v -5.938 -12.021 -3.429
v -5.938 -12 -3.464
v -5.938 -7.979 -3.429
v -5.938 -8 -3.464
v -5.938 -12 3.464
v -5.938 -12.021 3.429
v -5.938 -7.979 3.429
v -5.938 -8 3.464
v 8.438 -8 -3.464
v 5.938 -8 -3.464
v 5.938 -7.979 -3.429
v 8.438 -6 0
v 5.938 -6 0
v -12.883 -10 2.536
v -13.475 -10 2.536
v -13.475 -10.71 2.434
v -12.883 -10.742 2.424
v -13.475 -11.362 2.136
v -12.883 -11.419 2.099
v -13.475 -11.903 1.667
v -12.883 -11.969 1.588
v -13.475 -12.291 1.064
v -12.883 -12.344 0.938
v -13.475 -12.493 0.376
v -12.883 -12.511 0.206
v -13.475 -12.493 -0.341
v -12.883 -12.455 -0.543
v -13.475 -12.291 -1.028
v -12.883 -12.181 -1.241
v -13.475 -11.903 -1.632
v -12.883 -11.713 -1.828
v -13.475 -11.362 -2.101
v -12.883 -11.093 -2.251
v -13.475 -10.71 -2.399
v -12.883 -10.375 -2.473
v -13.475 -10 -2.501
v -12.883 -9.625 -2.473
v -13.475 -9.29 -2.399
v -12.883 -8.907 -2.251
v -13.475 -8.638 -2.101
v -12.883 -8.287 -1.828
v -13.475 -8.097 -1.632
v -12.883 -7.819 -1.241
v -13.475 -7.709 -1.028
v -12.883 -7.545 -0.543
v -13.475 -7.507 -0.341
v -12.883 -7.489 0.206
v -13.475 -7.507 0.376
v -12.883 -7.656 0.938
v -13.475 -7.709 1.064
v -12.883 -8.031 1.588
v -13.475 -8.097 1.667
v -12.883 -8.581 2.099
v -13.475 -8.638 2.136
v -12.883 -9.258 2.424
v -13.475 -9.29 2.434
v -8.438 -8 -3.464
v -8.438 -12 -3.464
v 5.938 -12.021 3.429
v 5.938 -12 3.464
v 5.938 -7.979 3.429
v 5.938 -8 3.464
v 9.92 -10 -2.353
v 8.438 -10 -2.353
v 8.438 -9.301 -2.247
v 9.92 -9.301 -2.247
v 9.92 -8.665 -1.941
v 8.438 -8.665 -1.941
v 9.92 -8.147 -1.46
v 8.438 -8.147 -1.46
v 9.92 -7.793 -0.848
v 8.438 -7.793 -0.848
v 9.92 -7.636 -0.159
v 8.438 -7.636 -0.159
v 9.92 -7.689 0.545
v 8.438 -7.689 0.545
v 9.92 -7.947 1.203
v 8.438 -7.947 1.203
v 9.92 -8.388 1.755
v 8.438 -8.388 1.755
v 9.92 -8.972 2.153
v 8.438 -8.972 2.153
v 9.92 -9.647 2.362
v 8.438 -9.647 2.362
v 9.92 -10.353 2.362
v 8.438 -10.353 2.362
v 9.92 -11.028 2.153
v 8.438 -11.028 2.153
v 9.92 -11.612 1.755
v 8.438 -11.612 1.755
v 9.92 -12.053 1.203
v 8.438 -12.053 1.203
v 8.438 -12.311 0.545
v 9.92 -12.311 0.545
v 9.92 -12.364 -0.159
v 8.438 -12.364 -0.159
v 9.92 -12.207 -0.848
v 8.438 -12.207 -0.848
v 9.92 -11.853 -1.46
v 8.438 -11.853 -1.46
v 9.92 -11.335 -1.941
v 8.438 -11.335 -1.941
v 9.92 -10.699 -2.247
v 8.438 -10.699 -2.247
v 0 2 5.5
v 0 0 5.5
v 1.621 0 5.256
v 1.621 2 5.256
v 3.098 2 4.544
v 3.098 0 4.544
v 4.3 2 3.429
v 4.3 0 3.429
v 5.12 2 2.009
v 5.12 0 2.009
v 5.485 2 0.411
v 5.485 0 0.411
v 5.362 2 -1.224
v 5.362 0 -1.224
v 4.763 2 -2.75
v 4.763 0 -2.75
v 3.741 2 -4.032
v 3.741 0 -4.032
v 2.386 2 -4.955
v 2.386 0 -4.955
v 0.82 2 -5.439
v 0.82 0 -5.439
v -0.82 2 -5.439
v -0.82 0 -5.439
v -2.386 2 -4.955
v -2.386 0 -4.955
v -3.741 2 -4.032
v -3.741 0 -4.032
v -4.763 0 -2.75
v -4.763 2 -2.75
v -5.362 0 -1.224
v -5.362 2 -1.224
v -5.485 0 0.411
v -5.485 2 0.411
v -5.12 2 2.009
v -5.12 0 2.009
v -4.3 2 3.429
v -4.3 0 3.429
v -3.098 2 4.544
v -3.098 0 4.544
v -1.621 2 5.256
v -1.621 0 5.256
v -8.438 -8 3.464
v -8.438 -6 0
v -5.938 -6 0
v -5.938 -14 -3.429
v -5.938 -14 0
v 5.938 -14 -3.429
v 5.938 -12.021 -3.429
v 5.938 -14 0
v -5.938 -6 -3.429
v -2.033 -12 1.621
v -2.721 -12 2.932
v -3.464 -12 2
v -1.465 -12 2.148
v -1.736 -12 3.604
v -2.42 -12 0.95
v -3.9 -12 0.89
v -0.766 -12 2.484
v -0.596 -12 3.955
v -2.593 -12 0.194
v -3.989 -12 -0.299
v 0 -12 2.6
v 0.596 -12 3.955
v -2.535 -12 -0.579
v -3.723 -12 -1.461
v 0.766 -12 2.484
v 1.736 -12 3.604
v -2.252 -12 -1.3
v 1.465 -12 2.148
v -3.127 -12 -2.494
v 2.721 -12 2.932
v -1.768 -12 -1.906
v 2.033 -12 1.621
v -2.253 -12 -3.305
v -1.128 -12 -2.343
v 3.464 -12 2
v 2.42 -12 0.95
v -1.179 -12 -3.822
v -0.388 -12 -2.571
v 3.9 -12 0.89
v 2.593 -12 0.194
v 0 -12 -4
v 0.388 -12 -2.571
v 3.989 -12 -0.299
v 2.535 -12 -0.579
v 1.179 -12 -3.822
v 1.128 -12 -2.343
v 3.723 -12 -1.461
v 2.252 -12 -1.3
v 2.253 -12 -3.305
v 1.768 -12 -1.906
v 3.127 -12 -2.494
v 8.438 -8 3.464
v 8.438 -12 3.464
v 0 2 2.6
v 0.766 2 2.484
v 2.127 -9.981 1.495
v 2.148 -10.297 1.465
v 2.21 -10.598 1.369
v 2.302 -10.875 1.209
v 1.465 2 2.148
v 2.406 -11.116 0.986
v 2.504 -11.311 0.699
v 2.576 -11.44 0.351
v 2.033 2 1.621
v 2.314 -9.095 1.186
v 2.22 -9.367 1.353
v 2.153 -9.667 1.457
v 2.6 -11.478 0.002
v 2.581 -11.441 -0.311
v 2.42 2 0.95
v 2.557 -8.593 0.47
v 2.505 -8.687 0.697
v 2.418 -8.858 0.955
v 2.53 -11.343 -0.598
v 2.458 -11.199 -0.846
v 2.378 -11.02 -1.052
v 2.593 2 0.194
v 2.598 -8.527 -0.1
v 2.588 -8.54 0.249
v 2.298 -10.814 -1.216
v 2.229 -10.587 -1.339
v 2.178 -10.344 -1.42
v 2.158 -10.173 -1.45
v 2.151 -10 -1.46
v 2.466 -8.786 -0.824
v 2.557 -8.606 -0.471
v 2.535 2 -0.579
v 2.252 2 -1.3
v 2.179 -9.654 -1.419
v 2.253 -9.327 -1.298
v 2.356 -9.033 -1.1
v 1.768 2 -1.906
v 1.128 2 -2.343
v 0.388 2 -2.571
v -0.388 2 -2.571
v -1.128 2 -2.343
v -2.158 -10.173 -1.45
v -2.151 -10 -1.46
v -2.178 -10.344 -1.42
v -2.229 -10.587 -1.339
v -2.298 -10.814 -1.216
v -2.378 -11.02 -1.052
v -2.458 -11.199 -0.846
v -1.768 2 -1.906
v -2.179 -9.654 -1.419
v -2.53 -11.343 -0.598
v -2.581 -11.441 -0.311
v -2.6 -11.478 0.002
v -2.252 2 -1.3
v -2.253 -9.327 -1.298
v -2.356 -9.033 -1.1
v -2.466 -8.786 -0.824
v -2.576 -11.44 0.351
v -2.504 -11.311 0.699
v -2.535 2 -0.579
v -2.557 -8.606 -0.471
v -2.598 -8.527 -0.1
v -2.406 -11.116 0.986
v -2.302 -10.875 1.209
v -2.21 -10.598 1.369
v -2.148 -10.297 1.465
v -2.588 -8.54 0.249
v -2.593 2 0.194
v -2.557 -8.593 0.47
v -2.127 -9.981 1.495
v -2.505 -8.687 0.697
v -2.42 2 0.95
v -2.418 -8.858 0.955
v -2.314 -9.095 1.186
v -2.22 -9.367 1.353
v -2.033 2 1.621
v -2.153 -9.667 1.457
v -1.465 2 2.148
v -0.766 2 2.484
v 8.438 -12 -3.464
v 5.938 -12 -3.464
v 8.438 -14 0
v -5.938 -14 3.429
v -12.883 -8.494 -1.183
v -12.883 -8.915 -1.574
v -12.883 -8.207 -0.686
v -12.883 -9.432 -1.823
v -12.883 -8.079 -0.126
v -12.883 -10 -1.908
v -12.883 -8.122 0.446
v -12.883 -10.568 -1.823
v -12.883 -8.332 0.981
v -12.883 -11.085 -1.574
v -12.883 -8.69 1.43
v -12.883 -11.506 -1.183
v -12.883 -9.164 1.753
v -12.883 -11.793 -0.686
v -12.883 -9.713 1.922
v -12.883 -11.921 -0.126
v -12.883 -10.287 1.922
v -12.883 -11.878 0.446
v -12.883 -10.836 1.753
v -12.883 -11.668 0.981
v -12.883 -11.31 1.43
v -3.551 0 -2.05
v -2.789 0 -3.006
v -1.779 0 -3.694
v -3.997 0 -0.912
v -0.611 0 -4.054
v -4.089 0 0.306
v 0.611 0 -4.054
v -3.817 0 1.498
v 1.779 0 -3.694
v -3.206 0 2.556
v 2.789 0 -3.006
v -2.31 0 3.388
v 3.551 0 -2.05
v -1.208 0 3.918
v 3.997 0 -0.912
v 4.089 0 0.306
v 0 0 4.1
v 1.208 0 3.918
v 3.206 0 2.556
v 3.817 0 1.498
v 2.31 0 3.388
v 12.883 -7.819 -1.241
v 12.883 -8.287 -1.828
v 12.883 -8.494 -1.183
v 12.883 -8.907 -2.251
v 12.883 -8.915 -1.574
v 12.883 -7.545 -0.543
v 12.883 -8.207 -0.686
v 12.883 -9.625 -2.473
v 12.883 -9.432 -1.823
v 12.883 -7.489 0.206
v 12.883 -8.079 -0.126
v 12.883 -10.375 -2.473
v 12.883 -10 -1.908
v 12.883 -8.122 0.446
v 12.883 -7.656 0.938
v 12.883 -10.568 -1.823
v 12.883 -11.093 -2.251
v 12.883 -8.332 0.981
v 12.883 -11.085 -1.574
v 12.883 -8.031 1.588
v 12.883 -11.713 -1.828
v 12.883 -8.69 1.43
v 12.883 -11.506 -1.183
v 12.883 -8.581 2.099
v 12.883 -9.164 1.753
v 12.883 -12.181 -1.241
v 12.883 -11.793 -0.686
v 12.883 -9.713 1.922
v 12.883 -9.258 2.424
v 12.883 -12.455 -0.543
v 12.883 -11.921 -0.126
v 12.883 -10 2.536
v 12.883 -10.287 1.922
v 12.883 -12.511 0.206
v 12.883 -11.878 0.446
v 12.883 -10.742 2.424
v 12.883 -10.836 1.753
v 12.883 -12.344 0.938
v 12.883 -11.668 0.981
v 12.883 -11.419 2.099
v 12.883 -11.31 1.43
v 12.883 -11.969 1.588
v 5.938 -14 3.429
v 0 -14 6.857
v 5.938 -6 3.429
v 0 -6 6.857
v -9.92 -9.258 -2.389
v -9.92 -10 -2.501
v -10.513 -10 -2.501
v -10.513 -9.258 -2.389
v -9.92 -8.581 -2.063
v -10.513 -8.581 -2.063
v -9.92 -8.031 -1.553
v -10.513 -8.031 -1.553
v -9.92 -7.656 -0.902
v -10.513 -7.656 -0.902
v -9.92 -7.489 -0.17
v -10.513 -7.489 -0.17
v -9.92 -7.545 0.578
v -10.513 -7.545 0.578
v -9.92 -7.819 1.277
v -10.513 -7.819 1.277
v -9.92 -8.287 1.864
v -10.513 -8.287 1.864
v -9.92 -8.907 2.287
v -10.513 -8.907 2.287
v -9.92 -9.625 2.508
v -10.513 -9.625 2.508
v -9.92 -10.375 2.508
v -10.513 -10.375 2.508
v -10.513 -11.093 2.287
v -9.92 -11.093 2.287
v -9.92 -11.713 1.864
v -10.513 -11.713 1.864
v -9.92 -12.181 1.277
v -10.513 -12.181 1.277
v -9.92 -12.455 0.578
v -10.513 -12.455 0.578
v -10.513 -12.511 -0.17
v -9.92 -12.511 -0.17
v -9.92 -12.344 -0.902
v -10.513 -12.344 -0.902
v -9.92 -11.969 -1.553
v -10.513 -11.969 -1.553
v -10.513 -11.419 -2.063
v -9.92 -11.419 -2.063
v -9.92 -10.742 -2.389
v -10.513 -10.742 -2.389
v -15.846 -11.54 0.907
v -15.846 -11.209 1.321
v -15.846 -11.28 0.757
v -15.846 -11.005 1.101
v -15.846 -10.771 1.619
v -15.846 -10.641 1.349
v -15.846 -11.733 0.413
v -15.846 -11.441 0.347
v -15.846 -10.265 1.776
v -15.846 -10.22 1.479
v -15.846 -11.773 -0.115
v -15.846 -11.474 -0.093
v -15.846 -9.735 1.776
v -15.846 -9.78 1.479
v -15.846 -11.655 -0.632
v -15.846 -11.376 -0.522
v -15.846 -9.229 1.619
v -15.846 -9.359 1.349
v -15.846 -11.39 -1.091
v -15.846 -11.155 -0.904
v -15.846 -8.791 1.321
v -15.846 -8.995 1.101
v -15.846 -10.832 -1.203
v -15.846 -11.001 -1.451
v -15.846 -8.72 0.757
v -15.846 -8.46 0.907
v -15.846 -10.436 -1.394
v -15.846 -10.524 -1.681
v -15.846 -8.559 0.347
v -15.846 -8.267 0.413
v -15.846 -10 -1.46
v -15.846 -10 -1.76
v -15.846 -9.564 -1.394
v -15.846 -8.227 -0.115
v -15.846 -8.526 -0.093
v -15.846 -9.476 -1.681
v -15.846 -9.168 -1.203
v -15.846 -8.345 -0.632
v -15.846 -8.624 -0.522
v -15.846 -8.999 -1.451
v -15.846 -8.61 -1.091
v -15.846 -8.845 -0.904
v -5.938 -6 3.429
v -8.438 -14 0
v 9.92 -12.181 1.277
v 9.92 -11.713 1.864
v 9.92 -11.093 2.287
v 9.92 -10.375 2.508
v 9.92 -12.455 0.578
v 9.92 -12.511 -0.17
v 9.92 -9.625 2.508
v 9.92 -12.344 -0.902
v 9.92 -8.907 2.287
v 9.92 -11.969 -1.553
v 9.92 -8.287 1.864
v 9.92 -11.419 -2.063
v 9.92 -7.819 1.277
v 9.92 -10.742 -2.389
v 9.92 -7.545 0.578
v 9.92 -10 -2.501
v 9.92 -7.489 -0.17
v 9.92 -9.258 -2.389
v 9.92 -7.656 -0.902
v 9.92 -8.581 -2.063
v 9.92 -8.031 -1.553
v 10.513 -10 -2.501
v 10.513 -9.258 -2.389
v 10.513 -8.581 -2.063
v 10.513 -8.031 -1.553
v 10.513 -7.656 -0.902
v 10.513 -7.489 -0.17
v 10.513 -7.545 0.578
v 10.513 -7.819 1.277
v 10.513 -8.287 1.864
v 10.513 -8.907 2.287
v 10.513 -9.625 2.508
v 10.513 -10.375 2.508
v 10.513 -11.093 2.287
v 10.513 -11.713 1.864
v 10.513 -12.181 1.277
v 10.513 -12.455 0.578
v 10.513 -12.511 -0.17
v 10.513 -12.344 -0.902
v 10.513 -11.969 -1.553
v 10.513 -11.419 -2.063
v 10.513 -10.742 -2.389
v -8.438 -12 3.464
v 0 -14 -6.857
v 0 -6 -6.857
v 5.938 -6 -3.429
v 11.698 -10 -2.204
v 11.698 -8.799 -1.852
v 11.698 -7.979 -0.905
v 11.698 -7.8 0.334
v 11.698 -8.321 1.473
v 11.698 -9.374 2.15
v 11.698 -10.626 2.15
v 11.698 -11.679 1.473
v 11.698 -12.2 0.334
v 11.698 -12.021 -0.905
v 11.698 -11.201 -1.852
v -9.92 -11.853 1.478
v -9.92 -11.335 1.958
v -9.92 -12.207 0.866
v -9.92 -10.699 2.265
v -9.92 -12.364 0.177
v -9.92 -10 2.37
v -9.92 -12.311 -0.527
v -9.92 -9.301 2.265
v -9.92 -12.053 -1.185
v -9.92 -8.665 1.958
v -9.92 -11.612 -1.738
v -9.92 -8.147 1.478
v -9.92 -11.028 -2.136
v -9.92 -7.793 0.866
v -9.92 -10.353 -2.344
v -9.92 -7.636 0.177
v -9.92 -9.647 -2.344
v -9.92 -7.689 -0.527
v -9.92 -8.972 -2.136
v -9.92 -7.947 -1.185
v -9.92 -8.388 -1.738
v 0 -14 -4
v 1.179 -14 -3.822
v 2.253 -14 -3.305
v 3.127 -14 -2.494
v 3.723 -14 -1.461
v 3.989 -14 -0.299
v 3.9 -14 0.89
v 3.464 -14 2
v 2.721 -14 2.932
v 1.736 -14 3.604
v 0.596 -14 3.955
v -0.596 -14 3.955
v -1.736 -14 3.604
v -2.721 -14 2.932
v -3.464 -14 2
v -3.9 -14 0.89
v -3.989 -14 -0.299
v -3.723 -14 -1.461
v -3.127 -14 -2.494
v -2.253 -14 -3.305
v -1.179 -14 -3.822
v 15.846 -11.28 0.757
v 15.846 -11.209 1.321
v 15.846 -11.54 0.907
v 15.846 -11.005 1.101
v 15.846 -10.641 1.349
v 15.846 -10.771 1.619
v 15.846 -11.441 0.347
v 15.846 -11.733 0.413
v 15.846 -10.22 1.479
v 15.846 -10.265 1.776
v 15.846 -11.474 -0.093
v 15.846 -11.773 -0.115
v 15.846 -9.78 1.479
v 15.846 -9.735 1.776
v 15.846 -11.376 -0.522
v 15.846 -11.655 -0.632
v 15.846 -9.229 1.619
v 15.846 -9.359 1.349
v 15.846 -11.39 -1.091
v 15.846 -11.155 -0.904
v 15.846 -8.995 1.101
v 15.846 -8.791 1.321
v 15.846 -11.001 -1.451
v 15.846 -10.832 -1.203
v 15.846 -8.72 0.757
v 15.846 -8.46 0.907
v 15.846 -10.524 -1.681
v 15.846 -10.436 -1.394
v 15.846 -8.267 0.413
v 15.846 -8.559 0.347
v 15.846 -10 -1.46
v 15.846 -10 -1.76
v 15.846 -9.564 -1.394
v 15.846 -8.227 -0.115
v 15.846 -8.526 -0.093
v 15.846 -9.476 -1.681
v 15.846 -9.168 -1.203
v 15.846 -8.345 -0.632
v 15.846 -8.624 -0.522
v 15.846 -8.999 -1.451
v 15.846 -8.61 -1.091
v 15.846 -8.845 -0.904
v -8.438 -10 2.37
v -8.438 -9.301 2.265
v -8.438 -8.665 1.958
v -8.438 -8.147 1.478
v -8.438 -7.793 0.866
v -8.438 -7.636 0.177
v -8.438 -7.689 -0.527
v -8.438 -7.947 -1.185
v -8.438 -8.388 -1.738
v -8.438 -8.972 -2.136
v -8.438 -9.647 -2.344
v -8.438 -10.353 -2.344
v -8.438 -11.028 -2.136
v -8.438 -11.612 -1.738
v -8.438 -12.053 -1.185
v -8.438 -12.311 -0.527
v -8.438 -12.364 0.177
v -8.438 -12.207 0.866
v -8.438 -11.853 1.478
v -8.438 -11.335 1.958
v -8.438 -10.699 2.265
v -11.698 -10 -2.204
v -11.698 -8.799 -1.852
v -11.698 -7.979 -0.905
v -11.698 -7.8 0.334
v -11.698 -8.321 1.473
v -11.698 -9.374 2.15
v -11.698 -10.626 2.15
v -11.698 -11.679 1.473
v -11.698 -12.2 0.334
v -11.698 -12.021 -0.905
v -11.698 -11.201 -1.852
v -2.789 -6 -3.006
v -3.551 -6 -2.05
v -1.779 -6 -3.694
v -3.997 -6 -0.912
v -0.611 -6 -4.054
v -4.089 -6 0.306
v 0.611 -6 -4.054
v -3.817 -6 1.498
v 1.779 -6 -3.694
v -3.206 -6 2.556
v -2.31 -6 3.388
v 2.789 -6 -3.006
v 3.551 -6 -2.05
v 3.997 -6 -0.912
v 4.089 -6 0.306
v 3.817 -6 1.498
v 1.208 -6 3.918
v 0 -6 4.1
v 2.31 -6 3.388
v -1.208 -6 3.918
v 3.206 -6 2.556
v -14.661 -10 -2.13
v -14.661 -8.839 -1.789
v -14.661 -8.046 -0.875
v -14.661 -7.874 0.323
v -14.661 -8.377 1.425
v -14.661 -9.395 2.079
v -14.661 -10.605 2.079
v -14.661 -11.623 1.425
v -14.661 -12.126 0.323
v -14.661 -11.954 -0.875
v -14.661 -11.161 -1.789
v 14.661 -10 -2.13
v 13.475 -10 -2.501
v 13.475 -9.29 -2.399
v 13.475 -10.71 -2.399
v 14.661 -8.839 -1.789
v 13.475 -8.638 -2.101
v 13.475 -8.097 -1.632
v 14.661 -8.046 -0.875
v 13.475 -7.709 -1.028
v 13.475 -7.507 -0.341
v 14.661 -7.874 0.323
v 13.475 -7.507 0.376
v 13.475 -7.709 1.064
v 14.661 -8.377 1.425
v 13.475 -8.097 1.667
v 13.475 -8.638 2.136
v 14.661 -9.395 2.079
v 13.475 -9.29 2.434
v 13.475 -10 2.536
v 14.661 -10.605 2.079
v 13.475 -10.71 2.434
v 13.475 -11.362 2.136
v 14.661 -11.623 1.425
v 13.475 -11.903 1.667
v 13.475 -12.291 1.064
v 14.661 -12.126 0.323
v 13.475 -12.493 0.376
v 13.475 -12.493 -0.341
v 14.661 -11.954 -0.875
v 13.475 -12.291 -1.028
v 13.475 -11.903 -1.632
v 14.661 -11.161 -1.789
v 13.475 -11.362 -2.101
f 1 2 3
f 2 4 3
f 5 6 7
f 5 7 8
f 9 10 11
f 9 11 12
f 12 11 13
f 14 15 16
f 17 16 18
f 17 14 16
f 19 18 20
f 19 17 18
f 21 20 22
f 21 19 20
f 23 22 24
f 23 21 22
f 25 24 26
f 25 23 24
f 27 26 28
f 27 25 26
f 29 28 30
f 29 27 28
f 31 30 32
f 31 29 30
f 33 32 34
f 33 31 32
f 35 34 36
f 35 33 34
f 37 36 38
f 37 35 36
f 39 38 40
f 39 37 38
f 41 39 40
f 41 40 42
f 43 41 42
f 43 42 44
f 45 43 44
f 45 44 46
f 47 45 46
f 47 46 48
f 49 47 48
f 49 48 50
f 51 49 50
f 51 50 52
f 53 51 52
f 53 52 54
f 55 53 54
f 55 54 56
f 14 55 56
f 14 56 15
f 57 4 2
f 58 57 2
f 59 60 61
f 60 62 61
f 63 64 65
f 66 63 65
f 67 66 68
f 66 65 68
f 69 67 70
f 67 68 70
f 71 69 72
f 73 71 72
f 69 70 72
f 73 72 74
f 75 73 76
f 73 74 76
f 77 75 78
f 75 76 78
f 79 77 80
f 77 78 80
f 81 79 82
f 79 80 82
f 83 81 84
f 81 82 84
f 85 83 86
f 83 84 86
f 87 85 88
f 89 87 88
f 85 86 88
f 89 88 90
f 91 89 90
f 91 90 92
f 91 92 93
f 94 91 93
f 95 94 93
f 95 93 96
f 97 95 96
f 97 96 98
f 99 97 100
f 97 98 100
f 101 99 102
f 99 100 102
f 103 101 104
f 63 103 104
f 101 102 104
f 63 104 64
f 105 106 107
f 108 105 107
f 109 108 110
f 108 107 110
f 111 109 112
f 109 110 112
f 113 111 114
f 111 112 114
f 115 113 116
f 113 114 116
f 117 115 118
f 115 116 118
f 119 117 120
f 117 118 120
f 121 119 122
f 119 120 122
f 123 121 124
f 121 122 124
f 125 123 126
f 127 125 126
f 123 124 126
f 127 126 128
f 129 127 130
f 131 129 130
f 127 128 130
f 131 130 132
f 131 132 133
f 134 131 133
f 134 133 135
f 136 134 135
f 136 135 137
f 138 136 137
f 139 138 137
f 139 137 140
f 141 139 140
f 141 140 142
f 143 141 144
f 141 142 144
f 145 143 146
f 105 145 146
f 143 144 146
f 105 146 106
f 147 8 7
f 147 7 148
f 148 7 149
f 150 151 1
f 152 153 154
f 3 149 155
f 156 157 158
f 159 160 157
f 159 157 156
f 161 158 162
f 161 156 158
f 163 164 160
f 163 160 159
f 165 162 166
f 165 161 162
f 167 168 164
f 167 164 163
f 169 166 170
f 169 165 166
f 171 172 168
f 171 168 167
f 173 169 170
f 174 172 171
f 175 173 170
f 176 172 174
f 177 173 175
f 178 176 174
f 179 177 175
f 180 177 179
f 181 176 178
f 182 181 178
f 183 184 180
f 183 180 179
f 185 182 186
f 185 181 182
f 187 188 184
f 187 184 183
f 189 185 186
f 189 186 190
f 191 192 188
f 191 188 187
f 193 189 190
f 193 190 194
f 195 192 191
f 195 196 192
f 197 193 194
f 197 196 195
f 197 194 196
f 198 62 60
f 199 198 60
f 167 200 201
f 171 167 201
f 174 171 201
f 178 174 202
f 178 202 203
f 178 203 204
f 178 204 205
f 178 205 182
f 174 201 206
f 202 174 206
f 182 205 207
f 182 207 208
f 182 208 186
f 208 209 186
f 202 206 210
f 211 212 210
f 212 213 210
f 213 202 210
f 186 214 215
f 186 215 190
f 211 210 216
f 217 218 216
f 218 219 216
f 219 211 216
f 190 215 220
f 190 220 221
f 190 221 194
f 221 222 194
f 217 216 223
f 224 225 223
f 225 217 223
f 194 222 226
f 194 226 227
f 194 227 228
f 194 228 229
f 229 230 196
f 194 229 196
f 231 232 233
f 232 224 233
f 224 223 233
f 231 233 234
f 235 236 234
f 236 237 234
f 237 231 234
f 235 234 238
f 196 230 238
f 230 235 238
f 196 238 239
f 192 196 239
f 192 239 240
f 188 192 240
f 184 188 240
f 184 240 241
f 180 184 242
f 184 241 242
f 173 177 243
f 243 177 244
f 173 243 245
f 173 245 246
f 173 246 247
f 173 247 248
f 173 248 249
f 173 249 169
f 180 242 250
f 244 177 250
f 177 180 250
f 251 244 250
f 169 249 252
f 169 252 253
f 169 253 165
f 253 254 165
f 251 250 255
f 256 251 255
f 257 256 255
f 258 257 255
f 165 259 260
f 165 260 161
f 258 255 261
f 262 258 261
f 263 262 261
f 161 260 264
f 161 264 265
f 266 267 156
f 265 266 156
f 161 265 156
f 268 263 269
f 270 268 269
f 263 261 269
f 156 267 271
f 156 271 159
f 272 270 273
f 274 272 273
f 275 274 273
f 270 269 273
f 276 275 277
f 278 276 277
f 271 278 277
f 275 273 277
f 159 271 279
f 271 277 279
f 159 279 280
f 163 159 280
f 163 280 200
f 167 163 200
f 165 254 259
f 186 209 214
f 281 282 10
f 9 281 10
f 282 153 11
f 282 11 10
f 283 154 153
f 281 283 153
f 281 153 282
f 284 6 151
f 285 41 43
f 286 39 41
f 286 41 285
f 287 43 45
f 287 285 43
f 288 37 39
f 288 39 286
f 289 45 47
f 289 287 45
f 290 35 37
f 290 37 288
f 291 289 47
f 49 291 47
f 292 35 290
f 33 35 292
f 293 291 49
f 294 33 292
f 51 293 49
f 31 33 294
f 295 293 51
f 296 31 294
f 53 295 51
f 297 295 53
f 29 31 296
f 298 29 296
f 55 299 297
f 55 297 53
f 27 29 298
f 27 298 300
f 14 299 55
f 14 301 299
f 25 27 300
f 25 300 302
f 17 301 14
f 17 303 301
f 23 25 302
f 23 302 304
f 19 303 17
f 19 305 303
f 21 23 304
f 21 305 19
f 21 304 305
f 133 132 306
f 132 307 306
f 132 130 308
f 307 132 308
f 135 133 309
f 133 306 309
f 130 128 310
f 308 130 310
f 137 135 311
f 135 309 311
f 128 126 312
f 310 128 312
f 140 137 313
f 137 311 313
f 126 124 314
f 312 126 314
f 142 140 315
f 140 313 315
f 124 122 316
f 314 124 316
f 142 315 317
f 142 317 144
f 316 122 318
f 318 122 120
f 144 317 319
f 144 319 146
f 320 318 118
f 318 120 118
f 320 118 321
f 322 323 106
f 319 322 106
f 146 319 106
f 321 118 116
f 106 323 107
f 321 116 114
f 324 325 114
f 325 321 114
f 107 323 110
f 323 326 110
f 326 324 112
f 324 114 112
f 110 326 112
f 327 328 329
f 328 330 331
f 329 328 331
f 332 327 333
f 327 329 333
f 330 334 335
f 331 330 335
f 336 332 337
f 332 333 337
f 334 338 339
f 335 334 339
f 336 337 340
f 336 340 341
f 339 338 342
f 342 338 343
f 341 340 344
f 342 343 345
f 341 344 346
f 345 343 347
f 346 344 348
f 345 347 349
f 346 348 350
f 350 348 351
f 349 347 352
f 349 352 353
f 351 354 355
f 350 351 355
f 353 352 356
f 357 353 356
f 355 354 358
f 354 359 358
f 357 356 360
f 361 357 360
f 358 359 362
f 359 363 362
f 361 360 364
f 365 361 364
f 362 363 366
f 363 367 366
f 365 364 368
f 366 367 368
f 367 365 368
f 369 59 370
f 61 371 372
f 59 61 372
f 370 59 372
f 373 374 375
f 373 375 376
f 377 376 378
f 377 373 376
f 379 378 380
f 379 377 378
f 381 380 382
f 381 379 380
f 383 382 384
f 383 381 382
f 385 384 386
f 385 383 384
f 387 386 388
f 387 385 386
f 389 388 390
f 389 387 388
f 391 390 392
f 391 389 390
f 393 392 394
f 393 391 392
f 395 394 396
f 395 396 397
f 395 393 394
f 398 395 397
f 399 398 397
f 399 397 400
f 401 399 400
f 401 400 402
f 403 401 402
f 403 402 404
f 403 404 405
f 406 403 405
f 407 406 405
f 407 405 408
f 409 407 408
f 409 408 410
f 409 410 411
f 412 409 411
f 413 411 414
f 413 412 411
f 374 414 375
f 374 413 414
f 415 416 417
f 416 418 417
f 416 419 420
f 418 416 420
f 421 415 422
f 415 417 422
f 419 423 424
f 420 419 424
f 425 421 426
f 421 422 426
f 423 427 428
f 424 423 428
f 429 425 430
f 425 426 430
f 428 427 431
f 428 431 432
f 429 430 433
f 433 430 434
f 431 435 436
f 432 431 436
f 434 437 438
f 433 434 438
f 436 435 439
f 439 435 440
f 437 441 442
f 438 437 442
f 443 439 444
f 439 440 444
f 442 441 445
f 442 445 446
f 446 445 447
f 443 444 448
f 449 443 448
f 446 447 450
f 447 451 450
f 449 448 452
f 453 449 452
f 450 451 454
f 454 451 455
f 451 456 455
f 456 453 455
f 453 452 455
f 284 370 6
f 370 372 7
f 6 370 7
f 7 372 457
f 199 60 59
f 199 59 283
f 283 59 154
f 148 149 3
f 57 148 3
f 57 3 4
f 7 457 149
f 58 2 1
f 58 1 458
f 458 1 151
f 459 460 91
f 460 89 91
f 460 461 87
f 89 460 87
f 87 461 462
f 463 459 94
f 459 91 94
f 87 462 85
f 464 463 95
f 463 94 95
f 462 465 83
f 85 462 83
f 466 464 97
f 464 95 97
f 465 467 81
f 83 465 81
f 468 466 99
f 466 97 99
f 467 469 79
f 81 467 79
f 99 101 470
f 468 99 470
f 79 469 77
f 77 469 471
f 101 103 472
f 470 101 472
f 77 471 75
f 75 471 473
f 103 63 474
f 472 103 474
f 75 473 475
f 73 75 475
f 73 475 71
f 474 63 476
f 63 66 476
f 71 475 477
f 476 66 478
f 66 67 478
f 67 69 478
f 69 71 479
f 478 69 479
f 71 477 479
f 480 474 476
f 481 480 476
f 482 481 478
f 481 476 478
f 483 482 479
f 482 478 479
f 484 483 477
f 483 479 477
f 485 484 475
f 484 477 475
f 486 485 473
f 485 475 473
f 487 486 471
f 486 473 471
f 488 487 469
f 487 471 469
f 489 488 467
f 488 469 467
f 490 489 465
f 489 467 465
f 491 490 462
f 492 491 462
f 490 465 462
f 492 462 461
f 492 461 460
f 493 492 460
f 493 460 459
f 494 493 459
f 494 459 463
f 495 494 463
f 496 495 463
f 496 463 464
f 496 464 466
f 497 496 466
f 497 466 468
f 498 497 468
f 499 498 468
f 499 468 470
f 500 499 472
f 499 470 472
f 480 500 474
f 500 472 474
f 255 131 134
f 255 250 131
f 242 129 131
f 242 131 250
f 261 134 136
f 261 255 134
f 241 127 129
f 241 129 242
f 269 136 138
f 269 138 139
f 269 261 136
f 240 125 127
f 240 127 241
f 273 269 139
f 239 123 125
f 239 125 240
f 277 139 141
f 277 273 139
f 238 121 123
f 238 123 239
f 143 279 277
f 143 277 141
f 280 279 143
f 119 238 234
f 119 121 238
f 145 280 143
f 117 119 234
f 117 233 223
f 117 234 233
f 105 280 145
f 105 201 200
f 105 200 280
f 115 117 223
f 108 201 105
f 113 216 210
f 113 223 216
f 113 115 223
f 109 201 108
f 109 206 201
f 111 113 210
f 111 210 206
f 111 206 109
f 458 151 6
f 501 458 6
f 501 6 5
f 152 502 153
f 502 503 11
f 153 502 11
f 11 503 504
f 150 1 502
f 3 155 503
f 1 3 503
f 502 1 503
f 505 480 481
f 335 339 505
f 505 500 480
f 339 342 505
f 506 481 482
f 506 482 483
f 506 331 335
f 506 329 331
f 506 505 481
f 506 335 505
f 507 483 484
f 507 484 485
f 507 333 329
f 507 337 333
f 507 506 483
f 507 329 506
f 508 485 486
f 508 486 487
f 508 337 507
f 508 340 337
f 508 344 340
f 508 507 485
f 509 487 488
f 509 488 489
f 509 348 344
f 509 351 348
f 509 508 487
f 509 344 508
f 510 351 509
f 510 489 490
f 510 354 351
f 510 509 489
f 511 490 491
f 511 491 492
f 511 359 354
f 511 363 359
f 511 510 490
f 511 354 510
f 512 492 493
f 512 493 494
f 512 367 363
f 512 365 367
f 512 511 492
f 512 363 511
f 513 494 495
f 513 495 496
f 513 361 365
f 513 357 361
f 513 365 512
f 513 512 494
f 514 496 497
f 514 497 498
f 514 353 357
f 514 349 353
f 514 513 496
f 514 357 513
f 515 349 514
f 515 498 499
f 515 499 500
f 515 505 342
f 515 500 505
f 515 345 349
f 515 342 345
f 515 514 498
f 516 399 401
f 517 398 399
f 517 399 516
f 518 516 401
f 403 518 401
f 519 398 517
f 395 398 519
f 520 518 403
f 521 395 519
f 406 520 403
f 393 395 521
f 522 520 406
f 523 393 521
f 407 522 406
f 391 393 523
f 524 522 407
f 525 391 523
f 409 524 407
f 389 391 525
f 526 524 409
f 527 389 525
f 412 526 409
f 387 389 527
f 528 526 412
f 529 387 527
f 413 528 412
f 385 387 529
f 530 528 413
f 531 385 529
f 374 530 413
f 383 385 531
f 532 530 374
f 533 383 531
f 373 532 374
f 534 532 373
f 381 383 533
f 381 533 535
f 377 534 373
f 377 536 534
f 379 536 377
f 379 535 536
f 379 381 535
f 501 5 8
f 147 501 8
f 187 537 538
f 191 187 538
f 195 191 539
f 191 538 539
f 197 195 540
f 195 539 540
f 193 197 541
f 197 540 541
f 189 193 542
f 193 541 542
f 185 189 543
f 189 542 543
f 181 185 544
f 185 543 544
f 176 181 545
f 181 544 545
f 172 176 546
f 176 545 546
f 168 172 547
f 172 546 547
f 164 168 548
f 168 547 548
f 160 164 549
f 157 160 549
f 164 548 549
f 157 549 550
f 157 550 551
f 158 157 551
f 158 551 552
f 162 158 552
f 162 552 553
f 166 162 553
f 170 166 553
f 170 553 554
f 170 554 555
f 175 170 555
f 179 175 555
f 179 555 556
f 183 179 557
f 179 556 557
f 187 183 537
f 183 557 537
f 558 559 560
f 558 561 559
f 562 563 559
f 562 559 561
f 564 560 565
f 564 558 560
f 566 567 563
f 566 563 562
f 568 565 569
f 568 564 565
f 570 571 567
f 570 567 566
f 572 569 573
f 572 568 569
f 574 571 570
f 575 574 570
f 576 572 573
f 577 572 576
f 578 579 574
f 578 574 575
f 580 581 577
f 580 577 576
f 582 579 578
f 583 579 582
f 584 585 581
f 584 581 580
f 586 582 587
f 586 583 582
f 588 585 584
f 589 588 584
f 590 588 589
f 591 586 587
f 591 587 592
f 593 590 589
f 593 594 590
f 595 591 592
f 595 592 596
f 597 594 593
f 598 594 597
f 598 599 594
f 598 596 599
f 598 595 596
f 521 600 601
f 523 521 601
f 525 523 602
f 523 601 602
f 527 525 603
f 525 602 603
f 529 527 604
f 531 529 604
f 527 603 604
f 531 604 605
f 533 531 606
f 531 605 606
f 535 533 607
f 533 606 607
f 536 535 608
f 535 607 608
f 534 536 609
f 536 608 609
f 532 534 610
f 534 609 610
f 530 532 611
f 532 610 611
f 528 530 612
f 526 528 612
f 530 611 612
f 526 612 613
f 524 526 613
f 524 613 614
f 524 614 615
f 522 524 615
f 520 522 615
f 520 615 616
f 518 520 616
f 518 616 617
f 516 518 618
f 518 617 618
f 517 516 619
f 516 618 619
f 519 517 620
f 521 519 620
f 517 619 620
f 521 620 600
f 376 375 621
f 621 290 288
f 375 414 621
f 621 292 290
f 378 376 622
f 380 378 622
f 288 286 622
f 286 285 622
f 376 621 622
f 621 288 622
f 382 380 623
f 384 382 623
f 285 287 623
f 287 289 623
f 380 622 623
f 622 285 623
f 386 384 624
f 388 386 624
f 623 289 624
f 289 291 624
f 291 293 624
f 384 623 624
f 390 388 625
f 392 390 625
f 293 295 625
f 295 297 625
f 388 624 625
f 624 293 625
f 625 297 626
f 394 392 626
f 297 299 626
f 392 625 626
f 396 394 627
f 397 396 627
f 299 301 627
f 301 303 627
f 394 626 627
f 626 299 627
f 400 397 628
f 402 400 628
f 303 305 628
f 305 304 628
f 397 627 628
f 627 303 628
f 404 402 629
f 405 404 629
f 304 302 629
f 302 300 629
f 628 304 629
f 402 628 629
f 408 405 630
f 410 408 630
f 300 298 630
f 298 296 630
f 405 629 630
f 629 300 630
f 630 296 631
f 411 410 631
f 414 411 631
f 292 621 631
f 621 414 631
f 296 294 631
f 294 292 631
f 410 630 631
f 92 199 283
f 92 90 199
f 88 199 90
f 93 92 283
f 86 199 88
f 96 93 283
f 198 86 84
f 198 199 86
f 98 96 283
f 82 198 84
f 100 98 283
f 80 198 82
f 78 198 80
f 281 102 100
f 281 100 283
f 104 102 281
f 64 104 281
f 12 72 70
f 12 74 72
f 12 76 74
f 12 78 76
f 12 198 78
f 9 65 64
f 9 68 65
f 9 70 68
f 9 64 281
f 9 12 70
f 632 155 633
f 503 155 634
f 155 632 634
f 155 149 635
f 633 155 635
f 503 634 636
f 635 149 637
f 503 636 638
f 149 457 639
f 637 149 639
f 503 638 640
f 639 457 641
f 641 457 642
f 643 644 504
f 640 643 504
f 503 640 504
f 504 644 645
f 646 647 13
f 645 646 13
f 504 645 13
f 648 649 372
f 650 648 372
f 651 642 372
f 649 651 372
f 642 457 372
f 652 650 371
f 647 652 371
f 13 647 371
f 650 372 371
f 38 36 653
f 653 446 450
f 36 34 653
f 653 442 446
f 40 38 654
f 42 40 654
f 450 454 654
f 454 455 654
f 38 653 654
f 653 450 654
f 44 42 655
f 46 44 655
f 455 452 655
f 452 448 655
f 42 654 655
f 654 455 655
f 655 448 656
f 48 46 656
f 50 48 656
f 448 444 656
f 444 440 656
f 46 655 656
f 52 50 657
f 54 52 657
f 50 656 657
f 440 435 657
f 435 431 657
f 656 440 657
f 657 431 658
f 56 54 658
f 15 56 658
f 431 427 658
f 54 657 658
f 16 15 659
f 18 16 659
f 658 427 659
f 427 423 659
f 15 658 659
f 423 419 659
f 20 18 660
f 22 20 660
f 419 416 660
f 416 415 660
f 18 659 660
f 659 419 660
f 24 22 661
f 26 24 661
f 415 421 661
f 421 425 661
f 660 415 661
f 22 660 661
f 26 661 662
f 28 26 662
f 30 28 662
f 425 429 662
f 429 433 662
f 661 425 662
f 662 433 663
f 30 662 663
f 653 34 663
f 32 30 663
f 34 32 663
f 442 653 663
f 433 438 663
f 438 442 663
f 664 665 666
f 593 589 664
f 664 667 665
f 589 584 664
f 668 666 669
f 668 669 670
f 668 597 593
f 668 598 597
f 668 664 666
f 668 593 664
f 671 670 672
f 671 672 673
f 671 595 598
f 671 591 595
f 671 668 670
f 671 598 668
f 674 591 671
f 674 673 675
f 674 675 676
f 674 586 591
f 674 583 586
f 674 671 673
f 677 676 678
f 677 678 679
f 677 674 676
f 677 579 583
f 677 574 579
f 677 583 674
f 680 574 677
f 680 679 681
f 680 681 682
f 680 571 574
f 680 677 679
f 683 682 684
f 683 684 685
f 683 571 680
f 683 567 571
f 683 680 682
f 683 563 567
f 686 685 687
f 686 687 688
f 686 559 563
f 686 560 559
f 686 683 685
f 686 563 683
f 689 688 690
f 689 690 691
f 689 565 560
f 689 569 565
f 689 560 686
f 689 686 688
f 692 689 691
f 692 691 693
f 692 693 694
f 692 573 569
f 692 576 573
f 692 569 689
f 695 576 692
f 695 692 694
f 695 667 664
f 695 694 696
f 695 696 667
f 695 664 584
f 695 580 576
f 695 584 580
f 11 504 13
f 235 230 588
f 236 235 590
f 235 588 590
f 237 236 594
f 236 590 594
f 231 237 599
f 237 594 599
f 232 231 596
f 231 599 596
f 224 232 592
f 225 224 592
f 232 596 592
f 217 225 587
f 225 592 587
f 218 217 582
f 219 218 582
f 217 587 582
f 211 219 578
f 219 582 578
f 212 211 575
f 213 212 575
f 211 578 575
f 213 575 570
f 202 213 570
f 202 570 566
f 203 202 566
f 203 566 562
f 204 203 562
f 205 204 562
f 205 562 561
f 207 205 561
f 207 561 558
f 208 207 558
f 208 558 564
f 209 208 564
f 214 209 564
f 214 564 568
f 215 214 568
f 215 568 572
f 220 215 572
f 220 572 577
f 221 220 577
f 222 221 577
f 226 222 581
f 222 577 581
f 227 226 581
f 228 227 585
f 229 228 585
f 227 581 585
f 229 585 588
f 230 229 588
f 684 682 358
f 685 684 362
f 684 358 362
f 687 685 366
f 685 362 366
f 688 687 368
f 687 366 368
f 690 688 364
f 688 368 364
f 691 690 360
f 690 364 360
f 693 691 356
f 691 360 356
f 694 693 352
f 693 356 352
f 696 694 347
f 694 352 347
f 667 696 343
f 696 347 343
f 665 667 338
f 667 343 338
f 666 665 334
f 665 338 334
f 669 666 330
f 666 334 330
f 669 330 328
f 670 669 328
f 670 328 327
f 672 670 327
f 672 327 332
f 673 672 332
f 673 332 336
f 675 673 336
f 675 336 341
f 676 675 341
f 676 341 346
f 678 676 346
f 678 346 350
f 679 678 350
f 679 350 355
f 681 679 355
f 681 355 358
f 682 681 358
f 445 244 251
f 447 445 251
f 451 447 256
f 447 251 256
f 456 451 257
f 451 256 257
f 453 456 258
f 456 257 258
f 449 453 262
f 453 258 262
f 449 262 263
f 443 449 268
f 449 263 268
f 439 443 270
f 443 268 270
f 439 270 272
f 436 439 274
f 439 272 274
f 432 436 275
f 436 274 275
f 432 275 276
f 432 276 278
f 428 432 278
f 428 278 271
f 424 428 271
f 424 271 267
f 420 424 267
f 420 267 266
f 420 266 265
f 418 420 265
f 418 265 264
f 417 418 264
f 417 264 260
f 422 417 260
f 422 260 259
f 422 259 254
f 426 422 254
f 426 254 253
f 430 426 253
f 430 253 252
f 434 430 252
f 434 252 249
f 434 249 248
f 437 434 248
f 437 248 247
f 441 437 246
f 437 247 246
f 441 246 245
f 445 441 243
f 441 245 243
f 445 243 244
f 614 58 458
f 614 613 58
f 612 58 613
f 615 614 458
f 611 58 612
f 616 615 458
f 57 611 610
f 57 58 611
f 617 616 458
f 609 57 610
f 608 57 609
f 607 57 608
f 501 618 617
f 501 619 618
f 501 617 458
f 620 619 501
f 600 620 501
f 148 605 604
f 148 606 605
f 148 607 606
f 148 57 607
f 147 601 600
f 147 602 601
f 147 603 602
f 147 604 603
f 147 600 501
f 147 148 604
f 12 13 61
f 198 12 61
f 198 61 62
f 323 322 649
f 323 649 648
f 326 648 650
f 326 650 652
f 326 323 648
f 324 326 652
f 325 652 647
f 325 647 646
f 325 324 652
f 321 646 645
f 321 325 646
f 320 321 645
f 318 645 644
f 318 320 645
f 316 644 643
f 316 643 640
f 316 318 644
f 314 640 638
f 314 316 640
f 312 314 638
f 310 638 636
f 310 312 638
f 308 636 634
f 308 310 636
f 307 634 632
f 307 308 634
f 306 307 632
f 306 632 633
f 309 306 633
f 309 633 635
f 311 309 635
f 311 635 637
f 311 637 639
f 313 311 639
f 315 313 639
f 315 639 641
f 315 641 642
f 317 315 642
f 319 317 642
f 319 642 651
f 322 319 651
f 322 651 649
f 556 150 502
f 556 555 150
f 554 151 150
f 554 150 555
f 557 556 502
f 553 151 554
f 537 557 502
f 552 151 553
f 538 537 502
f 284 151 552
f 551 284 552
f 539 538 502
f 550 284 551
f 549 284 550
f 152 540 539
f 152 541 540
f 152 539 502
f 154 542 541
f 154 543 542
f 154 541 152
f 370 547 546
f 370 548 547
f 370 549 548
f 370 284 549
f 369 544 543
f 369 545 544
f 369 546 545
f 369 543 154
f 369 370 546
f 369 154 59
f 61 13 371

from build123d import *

# Parameters (mm, degrees)
SKETCH1_R            = 5.5
SKETCH1_R_2          = 4.1
BOSS_EXTRUDE1_DEPTH  = 2
SKETCH2_R            = 4.1
BOSS_EXTRUDE2_DEPTH  = 8
SKETCH4_R            = 2.6
BOSS_EXTRUDE3_DEPTH  = 22
BOSS_EXTRUDE4_DEPTH  = 8
BOSS_EXTRUDE5_DEPTH  = 2.5
BOSS_EXTRUDE6_DEPTH  = 2.5
SKETCH8_R            = 2.6
CUT_EXTRUDE1_DEPTH   = 16
SKETCH9_R            = 2.37037037
BOSS_EXTRUDE7_DEPTH  = 1.481481481
SKETCH10_R           = 2.37037037
BOSS_EXTRUDE8_DEPTH  = 1.481481481
SKETCH11_R           = 2.518518519
BOSS_EXTRUDE9_DEPTH  = 0.592592593
SKETCH13_R           = 2.518518519
SKETCH12_R           = 1.925925926
SKETCH14_R           = 2.51851852
BOSS_EXTRUDE10_DEPTH = 0.592592593
SKETCH16_R           = 2.51851852
SKETCH15_R           = 1.77777778
SKETCH17_R           = 1.47777778
CUT_EXTRUDE2_DEPTH   = 31.691734637
SKETCH18_R           = 2.6
CUT_EXTRUDE3_DEPTH   = 6
SKETCH21_R           = 4
CUT_EXTRUDE4_DEPTH   = 2


with BuildPart() as part:
    # Sketch1 → Boss-Extrude1 (new body)
    with BuildSketch(Plane(origin=(0, 0, 0), x_dir=(1, 0, 0), z_dir=(0, 1, 0))):
        with Locations(Location((0, 0, 0), (0, 0, 270))):
            Circle(SKETCH1_R)
        with Locations(Location((0, 0, 0), (0, 0, 270))):
            Circle(SKETCH1_R_2, mode=Mode.SUBTRACT)
    extrude(amount=BOSS_EXTRUDE1_DEPTH)



with BuildPart() as body_2:
    # Sketch2 → Boss-Extrude2 (new body)
    with BuildSketch(Plane(origin=(0, 2, 0), x_dir=(1, 0, 0), z_dir=(0, 1, 0))):
        with Locations(Location((0, 0, 0), (0, 0, 270))):
            Circle(SKETCH2_R)
    extrude(amount=-BOSS_EXTRUDE2_DEPTH)


with BuildPart() as part_1:
    add(part.part)

    add(body_2.part)  # Boss-Extrude3 merges body 2
    # Sketch4 → Boss-Extrude3 (add)
    with BuildSketch(Plane(origin=(0, 2, 0), x_dir=(1, 0, 0), z_dir=(0, 1, 0))):
        with Locations(Location((0, 0, 0), (0, 0, 270))):
            Circle(SKETCH4_R)
    extrude(amount=-BOSS_EXTRUDE3_DEPTH)

    # Sketch5 → Boss-Extrude4 (add)
    with BuildSketch(Plane.XZ.offset(6)):
        Polygon((5.938459912, -3.428571429), (5.938459912, 3.428571429), (0, 6.857142857), (-5.938459912, 3.428571429), (-5.938459912, -3.428571429), (0, -6.857142857), align=None)
    extrude(amount=BOSS_EXTRUDE4_DEPTH)

    # Sketch6 → Boss-Extrude5 (add)
    with BuildSketch(Plane(origin=(5.938459912, 0, 0), x_dir=(0, 0, -1), z_dir=(1, 0, 0))):
        Polygon((0, -14), (3.464101615, -12), (3.464101615, -8), (0, -6), (-3.464101615, -8), (-3.464101615, -12), align=None)
    extrude(amount=BOSS_EXTRUDE5_DEPTH)

    # Sketch7 → Boss-Extrude6 (add)
    with BuildSketch(Plane.ZY.offset(5.938459912)):
        Polygon((0, -14), (3.464101615, -12), (3.464101615, -8), (0, -6), (-3.464101615, -8), (-3.464101615, -12), align=None)
    extrude(amount=BOSS_EXTRUDE6_DEPTH)

    # Sketch8 → Cut-Extrude1 (cut)
    with BuildSketch(Plane(origin=(0, 2, 0), x_dir=(1, 0, 0), z_dir=(0, 1, 0))):
        with Locations(Location((0, 0, 0), (0, 0, 270))):
            Circle(SKETCH8_R)
    extrude(amount=-CUT_EXTRUDE1_DEPTH, mode=Mode.SUBTRACT)


with BuildPart() as cut_extrude1_piece_1:
    # of the separate pieces the step leaves, piece 1, a body of its own (cut_extrude1_pieces)
    add(part_1.part.solids().sort_by_distance((0, 2, 5.5))[0])

    # Sketch9 → Boss-Extrude7 (add)
    with BuildSketch(Plane(origin=(8.438459912, 0, 0), x_dir=(0, 0, -1), z_dir=(1, 0, 0))):
        with Locations((-0.017765093, -10)):
            Circle(SKETCH9_R)
    extrude(amount=BOSS_EXTRUDE7_DEPTH)

    # Sketch10 → Boss-Extrude8 (add)
    with BuildSketch(Plane.ZY.offset(8.438459912)):
        with Locations((0, -10)):
            Circle(SKETCH10_R)
    extrude(amount=BOSS_EXTRUDE8_DEPTH)

    # Sketch11 → Boss-Extrude9 (add)
    with BuildSketch(Plane(origin=(9.919941393, 0, 0), x_dir=(0, 0, -1), z_dir=(1, 0, 0))):
        with Locations((-0.017765093, -10)):
            Circle(SKETCH11_R)
    boss_extrude9 = extrude(amount=BOSS_EXTRUDE9_DEPTH)

    # Sketch13 → Loft1 section 0
    with BuildSketch(Plane(origin=(10.512533986, 0, 0), x_dir=(0, 0, -1), z_dir=(1, 0, 0))):
        with Locations((-0.017765093, -10)):
            Circle(SKETCH13_R)
    # Sketch12 → Loft1 section 1
    with BuildSketch(Plane(origin=(12.882904356, 0, 0), x_dir=(0, 0, -1), z_dir=(1, 0, 0))):
        with Locations((-0.017765093, -10)):
            Circle(SKETCH12_R)
    loft1 = loft()

    # Sketch14 → Boss-Extrude10 (add)
    with BuildSketch(Plane(origin=(12.882904356, 0, 0), x_dir=(0, 0, -1), z_dir=(1, 0, 0))):
        with Locations(Location((-0.017765093, -10, 0), (0, 0, 180))):
            Circle(SKETCH14_R)
    boss_extrude10 = extrude(amount=BOSS_EXTRUDE10_DEPTH)

    # Sketch16 → Loft2 section 0
    with BuildSketch(Plane(origin=(13.475496948, 0, 0), x_dir=(0, 0, -1), z_dir=(1, 0, 0))):
        with Locations((-0.017765093, -10)):
            Circle(SKETCH16_R)
    # Sketch15 → Loft2 section 1
    with BuildSketch(Plane(origin=(15.845867318, 0, 0), x_dir=(0, 0, -1), z_dir=(1, 0, 0))):
        with Locations((-0.017765093, -10)):
            Circle(SKETCH15_R)
    loft2 = loft()

    # Mirror1: Boss-Extrude9, Loft1, Boss-Extrude10, Loft2 across plane
    add(boss_extrude9.mirror(Plane(origin=(0, 0, 0), x_dir=(0, 0, 1), z_dir=(1, 0, 0))))
    add(loft1.mirror(Plane(origin=(0, 0, 0), x_dir=(0, 0, 1), z_dir=(1, 0, 0))))
    add(boss_extrude10.mirror(Plane(origin=(0, 0, 0), x_dir=(0, 0, 1), z_dir=(1, 0, 0))))
    add(loft2.mirror(Plane(origin=(0, 0, 0), x_dir=(0, 0, 1), z_dir=(1, 0, 0))))

    # Sketch17 → Cut-Extrude2 (cut)
    with BuildSketch(Plane(origin=(15.845867318, 0, 0), x_dir=(0, 0, -1), z_dir=(1, 0, 0))):
        with Locations((-0.017765093, -10)):
            Circle(SKETCH17_R)
    extrude(amount=-CUT_EXTRUDE2_DEPTH, mode=Mode.SUBTRACT)

    # Sketch21 → Cut-Extrude4 (cut)
    with BuildSketch(Plane.XZ.offset(14)):
        with Locations(Location((0, 0, 0), (0, 0, 270))):
            Circle(SKETCH21_R)
    extrude(amount=-CUT_EXTRUDE4_DEPTH, mode=Mode.SUBTRACT)


with BuildPart() as cut_extrude1_piece_2:
    # of the separate pieces the step leaves, piece 2, a body of its own (cut_extrude1_pieces)
    add(part_1.part.solids().sort_by_distance((0, -20, 2.6))[0])

    # Sketch18 → Cut-Extrude3 (cut)
    with BuildSketch(Plane.XZ.offset(20)):
        with Locations(Location((0, 0, 0), (0, 0, 90))):
            Circle(SKETCH18_R)
    extrude(amount=-CUT_EXTRUDE3_DEPTH, mode=Mode.SUBTRACT)


solid = cut_extrude1_piece_1.part
